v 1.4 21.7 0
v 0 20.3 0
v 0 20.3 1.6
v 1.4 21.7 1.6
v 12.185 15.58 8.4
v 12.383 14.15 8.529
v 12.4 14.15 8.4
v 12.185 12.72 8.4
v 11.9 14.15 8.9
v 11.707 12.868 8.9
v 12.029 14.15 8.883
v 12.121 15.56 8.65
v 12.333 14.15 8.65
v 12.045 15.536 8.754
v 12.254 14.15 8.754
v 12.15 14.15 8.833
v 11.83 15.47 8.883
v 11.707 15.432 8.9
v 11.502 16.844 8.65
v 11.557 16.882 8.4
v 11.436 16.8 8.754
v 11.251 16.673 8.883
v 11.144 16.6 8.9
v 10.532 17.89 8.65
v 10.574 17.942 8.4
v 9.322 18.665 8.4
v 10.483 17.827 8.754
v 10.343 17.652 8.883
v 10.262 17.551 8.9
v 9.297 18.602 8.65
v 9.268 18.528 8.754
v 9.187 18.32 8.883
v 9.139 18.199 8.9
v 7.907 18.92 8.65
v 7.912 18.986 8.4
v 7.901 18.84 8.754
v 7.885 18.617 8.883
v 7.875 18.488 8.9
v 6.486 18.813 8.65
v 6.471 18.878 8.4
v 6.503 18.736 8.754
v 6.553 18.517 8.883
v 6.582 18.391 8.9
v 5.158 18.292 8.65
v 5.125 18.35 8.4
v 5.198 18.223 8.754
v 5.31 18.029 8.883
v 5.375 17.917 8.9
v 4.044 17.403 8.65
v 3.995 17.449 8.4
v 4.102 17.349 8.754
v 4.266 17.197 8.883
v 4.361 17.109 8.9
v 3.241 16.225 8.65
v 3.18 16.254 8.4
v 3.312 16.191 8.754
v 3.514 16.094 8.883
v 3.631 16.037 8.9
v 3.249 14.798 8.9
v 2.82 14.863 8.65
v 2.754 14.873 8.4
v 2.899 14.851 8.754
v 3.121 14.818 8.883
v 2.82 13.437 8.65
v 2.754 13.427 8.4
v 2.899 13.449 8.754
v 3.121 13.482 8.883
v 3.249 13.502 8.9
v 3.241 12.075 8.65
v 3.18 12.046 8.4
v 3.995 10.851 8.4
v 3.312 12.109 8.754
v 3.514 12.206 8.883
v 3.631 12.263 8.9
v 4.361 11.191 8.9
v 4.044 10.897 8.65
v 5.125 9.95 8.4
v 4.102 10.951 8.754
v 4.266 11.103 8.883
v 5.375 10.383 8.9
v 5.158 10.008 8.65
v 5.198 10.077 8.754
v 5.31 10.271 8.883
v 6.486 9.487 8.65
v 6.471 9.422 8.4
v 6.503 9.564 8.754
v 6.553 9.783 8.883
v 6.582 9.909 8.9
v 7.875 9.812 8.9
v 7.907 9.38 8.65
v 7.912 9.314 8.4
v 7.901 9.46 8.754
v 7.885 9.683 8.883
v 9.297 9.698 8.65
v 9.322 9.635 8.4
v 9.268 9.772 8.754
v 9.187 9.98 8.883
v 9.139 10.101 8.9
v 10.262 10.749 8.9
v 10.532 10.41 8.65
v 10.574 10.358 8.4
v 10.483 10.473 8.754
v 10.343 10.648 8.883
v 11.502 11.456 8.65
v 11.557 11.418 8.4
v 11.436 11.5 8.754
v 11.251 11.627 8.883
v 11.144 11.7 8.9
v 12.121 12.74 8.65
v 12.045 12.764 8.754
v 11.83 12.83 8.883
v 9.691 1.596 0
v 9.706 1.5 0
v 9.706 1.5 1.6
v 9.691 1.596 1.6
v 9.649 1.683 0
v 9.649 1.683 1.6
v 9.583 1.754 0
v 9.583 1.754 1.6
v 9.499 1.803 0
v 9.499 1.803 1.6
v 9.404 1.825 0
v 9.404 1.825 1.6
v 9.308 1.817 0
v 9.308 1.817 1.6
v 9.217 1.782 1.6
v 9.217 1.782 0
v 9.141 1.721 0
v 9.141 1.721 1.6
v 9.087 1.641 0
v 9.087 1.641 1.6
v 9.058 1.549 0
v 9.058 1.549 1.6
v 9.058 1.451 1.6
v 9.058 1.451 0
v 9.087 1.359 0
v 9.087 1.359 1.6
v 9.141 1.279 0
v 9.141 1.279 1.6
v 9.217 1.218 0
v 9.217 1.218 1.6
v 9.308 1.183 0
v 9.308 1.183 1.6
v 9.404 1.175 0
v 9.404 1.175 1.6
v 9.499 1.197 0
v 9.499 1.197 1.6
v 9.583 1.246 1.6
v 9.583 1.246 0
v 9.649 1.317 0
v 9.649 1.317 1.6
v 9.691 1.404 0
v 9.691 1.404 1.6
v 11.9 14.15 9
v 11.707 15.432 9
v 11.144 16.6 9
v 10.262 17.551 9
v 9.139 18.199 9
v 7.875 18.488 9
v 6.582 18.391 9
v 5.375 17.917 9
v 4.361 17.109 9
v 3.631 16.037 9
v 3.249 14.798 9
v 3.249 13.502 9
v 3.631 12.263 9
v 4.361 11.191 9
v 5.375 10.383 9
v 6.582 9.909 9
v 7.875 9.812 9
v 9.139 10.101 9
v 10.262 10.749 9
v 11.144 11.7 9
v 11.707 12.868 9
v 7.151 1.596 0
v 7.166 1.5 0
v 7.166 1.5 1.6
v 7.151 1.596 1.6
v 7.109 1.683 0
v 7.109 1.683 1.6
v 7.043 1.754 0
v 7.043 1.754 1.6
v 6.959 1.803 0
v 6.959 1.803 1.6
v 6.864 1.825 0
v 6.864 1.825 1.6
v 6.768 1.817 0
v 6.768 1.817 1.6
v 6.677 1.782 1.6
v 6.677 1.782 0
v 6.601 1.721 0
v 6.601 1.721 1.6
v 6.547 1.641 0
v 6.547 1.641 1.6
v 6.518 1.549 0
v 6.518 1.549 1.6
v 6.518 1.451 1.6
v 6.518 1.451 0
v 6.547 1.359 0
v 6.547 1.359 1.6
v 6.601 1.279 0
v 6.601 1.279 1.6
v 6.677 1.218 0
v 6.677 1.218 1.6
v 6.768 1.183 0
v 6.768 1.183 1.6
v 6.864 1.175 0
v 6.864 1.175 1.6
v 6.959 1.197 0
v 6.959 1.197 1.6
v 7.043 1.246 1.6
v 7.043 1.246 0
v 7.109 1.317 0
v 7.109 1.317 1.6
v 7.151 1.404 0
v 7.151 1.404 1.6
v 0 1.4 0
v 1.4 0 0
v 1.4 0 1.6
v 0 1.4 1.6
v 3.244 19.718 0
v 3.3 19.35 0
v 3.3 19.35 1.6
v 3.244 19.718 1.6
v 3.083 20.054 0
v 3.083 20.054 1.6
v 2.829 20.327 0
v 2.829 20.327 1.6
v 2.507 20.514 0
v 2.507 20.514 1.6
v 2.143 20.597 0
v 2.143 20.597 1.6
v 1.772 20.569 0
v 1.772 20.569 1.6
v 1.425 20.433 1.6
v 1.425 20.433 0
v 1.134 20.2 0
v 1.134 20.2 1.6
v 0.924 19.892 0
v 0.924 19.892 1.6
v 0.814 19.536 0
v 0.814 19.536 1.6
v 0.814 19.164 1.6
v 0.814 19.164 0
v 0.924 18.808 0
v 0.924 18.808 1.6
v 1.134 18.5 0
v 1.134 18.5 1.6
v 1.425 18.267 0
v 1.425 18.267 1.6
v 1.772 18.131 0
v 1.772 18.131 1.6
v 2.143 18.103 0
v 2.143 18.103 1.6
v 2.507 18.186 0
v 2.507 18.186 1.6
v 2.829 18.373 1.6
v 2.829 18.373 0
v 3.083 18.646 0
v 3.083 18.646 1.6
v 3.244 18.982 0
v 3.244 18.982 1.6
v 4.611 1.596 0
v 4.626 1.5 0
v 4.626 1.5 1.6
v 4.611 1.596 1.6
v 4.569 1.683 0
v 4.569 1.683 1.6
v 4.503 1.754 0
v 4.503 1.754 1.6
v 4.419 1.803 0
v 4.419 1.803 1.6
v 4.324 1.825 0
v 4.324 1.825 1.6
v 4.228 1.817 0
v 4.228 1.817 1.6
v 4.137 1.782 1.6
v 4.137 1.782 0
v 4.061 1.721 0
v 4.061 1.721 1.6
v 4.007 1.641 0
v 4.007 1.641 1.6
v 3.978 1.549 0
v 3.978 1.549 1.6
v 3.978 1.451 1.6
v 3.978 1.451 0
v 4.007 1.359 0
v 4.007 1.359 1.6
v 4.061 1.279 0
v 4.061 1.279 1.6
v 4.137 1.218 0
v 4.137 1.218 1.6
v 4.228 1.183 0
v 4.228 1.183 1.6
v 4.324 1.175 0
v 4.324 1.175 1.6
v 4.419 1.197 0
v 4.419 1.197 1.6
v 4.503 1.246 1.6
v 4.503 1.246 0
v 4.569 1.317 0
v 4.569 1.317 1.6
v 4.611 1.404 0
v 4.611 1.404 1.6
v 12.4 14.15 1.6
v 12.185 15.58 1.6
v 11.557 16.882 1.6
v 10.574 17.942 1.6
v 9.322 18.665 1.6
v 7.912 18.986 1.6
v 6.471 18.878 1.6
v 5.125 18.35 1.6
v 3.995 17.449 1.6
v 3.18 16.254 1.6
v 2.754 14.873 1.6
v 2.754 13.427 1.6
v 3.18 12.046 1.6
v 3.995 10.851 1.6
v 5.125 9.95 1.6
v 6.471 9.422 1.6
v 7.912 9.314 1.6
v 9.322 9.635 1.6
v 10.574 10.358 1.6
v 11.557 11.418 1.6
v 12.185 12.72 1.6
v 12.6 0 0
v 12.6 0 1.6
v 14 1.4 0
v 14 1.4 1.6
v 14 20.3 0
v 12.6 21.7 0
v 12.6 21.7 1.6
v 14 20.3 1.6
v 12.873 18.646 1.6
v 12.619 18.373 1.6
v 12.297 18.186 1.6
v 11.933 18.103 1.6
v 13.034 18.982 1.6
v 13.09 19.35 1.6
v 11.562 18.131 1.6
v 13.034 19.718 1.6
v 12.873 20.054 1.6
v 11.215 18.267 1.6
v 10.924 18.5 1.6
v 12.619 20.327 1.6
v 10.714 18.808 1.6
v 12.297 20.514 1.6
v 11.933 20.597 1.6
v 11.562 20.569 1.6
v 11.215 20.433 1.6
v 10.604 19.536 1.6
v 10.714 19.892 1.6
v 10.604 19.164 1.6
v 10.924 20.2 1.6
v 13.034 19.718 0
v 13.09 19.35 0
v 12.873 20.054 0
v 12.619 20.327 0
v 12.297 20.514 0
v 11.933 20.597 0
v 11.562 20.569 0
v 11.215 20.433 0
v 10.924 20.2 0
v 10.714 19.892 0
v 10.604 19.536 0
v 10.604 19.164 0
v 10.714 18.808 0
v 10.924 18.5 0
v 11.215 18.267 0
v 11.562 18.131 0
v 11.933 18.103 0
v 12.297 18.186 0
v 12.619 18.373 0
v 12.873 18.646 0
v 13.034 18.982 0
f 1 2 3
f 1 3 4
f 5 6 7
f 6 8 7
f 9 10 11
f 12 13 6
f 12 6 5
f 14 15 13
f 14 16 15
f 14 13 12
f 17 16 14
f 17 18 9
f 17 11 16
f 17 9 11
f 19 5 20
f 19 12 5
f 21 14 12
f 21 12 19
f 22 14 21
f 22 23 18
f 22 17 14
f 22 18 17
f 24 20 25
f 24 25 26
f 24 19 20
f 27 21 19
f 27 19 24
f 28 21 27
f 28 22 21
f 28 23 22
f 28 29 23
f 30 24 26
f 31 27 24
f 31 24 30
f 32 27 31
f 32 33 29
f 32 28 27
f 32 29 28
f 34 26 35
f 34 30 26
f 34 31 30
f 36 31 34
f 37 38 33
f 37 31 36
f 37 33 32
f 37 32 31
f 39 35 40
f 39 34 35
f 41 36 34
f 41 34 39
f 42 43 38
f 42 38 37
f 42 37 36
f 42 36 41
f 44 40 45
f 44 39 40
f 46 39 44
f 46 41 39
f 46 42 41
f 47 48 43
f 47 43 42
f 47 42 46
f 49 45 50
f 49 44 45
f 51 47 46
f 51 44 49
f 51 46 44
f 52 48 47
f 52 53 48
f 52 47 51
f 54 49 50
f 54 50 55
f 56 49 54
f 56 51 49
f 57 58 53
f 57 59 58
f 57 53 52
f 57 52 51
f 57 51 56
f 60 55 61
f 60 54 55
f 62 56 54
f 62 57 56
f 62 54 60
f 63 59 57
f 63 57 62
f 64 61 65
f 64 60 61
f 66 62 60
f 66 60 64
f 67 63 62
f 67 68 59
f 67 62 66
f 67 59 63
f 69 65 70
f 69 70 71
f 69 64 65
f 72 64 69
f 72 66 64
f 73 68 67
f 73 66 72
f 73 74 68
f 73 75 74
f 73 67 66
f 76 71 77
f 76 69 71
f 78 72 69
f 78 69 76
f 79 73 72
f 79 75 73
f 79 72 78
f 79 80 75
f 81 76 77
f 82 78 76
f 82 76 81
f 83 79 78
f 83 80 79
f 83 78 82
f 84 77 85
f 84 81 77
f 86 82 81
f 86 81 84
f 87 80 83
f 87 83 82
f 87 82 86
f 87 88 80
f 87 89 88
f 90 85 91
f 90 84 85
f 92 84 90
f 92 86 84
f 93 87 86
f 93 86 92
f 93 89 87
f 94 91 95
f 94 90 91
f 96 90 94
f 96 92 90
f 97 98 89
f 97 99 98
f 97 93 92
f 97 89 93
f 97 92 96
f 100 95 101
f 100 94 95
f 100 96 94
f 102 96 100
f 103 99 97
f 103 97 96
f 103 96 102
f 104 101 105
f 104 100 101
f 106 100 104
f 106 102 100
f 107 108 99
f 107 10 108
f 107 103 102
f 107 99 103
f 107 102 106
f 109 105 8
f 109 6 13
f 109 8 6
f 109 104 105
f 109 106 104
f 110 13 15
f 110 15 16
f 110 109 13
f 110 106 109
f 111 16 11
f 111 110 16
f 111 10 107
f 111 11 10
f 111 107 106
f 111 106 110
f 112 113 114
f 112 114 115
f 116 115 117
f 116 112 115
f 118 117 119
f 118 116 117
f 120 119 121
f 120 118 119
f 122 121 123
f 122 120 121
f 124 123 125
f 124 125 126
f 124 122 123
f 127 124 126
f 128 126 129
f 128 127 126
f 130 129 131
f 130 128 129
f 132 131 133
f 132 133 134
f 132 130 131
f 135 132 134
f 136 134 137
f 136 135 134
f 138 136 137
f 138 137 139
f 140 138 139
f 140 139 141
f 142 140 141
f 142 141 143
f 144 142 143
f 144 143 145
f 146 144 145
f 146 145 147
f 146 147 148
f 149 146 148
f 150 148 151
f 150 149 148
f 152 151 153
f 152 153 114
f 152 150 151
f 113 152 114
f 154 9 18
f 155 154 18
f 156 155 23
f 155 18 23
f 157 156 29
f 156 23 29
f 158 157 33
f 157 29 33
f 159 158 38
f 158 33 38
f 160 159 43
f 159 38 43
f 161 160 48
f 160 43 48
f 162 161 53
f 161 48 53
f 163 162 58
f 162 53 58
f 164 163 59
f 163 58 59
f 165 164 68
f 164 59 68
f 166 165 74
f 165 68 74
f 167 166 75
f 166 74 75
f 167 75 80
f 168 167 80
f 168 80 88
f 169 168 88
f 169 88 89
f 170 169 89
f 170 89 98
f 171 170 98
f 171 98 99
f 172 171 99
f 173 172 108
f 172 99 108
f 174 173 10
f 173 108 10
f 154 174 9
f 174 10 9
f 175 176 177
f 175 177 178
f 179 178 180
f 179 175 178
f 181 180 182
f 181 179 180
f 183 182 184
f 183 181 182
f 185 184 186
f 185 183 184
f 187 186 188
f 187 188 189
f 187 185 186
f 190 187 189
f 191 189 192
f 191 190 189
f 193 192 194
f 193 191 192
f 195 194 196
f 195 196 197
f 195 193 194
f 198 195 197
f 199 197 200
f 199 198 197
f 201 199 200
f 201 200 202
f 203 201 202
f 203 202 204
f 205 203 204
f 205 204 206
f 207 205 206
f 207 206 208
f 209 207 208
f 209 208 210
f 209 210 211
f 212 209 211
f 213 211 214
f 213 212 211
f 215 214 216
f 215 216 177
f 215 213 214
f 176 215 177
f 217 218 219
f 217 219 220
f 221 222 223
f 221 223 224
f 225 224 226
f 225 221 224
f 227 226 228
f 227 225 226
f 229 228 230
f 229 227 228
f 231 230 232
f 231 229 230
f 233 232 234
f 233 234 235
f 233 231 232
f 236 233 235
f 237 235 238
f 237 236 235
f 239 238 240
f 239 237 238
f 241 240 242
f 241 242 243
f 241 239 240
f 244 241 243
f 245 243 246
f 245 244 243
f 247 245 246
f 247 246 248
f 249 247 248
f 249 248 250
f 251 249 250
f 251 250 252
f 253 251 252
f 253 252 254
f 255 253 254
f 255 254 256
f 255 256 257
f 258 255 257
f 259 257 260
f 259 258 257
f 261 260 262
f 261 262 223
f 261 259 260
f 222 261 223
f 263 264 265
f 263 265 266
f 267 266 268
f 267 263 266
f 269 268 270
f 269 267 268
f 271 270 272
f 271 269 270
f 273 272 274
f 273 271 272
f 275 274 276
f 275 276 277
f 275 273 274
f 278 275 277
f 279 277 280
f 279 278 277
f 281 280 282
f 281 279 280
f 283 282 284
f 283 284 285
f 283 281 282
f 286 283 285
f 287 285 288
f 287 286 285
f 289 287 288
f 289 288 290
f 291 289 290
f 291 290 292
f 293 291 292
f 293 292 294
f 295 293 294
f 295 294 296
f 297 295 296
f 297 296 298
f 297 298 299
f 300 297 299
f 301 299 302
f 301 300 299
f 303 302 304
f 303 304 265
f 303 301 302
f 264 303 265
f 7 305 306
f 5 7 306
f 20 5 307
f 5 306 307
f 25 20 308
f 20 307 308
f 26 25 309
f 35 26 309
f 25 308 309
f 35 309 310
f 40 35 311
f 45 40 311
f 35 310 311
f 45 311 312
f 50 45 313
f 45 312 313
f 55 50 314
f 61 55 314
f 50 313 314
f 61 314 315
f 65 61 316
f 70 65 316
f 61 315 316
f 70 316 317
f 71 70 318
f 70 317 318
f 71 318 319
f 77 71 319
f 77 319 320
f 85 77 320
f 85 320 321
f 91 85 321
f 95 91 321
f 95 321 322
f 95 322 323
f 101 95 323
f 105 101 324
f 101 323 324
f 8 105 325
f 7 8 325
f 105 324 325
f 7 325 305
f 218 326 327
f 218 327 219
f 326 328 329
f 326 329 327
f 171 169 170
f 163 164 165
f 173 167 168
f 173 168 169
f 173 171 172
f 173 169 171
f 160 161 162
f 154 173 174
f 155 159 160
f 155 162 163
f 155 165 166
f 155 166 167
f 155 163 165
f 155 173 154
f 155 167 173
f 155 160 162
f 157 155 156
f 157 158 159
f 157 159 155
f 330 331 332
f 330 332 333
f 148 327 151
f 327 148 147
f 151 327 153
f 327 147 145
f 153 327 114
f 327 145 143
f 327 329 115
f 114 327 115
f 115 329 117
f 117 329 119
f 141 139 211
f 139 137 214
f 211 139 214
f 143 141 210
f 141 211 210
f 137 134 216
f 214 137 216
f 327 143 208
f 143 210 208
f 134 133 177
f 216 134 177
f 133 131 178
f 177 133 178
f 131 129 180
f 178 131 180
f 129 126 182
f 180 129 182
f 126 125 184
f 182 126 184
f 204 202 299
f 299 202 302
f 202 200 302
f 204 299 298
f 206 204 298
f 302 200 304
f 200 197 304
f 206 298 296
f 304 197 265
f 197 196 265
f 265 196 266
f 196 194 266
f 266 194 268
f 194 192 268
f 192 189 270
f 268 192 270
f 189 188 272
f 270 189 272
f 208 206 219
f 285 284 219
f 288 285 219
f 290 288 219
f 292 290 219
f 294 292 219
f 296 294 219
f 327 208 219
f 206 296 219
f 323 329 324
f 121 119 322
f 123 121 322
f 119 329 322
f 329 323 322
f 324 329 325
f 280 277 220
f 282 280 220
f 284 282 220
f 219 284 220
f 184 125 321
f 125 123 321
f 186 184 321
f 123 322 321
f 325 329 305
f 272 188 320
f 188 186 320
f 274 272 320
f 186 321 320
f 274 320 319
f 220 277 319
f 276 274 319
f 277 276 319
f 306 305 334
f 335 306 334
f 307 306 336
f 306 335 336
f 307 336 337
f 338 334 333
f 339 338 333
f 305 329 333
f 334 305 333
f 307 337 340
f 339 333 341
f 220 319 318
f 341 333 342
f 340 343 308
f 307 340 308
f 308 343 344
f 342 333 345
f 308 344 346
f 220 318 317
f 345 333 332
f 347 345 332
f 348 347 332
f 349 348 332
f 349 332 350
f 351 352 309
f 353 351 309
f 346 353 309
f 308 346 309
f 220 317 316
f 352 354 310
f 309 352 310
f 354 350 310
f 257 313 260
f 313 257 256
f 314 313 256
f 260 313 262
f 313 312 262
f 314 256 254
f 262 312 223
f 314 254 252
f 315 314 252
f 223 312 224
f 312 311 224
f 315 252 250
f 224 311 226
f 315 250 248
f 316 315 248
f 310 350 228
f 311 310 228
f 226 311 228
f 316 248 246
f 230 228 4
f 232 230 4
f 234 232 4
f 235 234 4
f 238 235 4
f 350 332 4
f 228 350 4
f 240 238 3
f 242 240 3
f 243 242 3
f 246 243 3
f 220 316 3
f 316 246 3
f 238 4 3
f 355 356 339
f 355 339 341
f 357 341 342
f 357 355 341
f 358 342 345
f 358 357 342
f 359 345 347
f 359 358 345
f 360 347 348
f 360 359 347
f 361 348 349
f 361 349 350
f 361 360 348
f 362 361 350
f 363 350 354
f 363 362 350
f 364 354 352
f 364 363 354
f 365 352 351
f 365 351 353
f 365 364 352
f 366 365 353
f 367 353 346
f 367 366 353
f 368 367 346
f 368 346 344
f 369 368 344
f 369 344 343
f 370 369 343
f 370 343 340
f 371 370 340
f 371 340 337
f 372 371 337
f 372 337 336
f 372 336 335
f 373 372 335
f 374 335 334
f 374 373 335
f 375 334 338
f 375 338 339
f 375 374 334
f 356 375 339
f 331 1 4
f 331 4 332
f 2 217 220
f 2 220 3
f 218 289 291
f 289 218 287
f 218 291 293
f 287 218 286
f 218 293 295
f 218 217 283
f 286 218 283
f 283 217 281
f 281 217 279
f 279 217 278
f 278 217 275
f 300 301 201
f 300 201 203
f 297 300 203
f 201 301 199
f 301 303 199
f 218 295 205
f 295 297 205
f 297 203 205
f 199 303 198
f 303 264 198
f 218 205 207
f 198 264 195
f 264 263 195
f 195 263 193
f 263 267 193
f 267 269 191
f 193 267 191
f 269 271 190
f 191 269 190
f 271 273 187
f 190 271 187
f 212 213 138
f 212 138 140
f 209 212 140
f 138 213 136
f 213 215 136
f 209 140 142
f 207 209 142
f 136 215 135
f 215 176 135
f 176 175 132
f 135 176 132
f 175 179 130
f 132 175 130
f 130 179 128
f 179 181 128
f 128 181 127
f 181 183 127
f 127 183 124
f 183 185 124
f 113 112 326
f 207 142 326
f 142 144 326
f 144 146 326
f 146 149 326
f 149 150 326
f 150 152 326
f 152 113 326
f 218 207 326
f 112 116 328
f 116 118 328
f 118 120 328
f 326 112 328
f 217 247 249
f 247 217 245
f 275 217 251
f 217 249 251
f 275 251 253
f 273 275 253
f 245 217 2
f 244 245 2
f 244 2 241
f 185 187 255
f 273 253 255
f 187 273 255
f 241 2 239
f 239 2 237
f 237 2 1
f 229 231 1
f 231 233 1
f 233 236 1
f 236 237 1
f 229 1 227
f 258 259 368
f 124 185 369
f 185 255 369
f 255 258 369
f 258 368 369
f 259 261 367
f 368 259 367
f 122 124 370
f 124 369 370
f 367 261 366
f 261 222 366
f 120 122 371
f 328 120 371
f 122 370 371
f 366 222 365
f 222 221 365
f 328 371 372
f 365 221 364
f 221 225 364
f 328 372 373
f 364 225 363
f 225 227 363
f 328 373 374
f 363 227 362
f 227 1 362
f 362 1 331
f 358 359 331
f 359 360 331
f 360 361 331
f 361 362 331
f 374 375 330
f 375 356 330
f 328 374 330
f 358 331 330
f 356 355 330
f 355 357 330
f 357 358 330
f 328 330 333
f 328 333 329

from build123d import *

# Parameters (mm, degrees)
SKETCH1_R           = 1.25
SKETCH1_R_2         = 4.85
SKETCH1_R_3         = 0.325511789
BOSS_EXTRUDE1_DEPTH = 1.6
BOSS_EXTRUDE2_START = 1.6
SKETCH1_3_R         = 4.85
BOSS_EXTRUDE2_DEPTH = 7.3
FILLET1_R           = 0.5
SKETCH2_R           = 4.35
BOSS_EXTRUDE3_DEPTH = 0.1


with BuildPart() as part:
    # Sketch1 → Boss-Extrude1 (new body)
    # profile 1 of 2: a face of its own
    with BuildSketch(Plane.XY):
        Polygon((0, 20.3), (1.4, 21.7), (12.6, 21.7), (14, 20.3), (14, 1.4), (12.6, 0), (1.4, 0), (0, 1.4), align=None)
        with Locations((2.05, 19.35)):
            Circle(SKETCH1_R, mode=Mode.SUBTRACT)
        with Locations((11.84, 19.35)):
            Circle(SKETCH1_R, mode=Mode.SUBTRACT)
        with Locations((7.55, 14.15)):
            Circle(SKETCH1_R_2, mode=Mode.SUBTRACT)
        with Locations((9.38, 1.5)):
            Circle(SKETCH1_R_3, mode=Mode.SUBTRACT)
        with Locations((6.84, 1.5)):
            Circle(SKETCH1_R_3, mode=Mode.SUBTRACT)
        with Locations((4.3, 1.5)):
            Circle(SKETCH1_R_3, mode=Mode.SUBTRACT)
    # profile 2 of 2: a face of its own
    with BuildSketch(Plane.XY):
        with Locations((7.55, 14.15)):
            Circle(SKETCH1_R_2)
    extrude(amount=BOSS_EXTRUDE1_DEPTH)

    # Sketch1<3> → Boss-Extrude2 (add)
    with BuildSketch(Plane.XY.offset(BOSS_EXTRUDE2_START)):
        with Locations((7.55, 14.15)):
            Circle(SKETCH1_3_R)
    extrude(amount=BOSS_EXTRUDE2_DEPTH)

    # Fillet1
    fillet1_edges = [part.edges().sort_by_distance(p)[0] for p in [
        (2.7, 14.15, 8.9),
    ]]
    fillet(fillet1_edges, radius=FILLET1_R)

    # Sketch2 → Boss-Extrude3 (add)
    with BuildSketch(Plane.XY.offset(8.9)):
        with Locations((7.55, 14.15)):
            Circle(SKETCH2_R)
    extrude(amount=BOSS_EXTRUDE3_DEPTH)


solid = part.part
